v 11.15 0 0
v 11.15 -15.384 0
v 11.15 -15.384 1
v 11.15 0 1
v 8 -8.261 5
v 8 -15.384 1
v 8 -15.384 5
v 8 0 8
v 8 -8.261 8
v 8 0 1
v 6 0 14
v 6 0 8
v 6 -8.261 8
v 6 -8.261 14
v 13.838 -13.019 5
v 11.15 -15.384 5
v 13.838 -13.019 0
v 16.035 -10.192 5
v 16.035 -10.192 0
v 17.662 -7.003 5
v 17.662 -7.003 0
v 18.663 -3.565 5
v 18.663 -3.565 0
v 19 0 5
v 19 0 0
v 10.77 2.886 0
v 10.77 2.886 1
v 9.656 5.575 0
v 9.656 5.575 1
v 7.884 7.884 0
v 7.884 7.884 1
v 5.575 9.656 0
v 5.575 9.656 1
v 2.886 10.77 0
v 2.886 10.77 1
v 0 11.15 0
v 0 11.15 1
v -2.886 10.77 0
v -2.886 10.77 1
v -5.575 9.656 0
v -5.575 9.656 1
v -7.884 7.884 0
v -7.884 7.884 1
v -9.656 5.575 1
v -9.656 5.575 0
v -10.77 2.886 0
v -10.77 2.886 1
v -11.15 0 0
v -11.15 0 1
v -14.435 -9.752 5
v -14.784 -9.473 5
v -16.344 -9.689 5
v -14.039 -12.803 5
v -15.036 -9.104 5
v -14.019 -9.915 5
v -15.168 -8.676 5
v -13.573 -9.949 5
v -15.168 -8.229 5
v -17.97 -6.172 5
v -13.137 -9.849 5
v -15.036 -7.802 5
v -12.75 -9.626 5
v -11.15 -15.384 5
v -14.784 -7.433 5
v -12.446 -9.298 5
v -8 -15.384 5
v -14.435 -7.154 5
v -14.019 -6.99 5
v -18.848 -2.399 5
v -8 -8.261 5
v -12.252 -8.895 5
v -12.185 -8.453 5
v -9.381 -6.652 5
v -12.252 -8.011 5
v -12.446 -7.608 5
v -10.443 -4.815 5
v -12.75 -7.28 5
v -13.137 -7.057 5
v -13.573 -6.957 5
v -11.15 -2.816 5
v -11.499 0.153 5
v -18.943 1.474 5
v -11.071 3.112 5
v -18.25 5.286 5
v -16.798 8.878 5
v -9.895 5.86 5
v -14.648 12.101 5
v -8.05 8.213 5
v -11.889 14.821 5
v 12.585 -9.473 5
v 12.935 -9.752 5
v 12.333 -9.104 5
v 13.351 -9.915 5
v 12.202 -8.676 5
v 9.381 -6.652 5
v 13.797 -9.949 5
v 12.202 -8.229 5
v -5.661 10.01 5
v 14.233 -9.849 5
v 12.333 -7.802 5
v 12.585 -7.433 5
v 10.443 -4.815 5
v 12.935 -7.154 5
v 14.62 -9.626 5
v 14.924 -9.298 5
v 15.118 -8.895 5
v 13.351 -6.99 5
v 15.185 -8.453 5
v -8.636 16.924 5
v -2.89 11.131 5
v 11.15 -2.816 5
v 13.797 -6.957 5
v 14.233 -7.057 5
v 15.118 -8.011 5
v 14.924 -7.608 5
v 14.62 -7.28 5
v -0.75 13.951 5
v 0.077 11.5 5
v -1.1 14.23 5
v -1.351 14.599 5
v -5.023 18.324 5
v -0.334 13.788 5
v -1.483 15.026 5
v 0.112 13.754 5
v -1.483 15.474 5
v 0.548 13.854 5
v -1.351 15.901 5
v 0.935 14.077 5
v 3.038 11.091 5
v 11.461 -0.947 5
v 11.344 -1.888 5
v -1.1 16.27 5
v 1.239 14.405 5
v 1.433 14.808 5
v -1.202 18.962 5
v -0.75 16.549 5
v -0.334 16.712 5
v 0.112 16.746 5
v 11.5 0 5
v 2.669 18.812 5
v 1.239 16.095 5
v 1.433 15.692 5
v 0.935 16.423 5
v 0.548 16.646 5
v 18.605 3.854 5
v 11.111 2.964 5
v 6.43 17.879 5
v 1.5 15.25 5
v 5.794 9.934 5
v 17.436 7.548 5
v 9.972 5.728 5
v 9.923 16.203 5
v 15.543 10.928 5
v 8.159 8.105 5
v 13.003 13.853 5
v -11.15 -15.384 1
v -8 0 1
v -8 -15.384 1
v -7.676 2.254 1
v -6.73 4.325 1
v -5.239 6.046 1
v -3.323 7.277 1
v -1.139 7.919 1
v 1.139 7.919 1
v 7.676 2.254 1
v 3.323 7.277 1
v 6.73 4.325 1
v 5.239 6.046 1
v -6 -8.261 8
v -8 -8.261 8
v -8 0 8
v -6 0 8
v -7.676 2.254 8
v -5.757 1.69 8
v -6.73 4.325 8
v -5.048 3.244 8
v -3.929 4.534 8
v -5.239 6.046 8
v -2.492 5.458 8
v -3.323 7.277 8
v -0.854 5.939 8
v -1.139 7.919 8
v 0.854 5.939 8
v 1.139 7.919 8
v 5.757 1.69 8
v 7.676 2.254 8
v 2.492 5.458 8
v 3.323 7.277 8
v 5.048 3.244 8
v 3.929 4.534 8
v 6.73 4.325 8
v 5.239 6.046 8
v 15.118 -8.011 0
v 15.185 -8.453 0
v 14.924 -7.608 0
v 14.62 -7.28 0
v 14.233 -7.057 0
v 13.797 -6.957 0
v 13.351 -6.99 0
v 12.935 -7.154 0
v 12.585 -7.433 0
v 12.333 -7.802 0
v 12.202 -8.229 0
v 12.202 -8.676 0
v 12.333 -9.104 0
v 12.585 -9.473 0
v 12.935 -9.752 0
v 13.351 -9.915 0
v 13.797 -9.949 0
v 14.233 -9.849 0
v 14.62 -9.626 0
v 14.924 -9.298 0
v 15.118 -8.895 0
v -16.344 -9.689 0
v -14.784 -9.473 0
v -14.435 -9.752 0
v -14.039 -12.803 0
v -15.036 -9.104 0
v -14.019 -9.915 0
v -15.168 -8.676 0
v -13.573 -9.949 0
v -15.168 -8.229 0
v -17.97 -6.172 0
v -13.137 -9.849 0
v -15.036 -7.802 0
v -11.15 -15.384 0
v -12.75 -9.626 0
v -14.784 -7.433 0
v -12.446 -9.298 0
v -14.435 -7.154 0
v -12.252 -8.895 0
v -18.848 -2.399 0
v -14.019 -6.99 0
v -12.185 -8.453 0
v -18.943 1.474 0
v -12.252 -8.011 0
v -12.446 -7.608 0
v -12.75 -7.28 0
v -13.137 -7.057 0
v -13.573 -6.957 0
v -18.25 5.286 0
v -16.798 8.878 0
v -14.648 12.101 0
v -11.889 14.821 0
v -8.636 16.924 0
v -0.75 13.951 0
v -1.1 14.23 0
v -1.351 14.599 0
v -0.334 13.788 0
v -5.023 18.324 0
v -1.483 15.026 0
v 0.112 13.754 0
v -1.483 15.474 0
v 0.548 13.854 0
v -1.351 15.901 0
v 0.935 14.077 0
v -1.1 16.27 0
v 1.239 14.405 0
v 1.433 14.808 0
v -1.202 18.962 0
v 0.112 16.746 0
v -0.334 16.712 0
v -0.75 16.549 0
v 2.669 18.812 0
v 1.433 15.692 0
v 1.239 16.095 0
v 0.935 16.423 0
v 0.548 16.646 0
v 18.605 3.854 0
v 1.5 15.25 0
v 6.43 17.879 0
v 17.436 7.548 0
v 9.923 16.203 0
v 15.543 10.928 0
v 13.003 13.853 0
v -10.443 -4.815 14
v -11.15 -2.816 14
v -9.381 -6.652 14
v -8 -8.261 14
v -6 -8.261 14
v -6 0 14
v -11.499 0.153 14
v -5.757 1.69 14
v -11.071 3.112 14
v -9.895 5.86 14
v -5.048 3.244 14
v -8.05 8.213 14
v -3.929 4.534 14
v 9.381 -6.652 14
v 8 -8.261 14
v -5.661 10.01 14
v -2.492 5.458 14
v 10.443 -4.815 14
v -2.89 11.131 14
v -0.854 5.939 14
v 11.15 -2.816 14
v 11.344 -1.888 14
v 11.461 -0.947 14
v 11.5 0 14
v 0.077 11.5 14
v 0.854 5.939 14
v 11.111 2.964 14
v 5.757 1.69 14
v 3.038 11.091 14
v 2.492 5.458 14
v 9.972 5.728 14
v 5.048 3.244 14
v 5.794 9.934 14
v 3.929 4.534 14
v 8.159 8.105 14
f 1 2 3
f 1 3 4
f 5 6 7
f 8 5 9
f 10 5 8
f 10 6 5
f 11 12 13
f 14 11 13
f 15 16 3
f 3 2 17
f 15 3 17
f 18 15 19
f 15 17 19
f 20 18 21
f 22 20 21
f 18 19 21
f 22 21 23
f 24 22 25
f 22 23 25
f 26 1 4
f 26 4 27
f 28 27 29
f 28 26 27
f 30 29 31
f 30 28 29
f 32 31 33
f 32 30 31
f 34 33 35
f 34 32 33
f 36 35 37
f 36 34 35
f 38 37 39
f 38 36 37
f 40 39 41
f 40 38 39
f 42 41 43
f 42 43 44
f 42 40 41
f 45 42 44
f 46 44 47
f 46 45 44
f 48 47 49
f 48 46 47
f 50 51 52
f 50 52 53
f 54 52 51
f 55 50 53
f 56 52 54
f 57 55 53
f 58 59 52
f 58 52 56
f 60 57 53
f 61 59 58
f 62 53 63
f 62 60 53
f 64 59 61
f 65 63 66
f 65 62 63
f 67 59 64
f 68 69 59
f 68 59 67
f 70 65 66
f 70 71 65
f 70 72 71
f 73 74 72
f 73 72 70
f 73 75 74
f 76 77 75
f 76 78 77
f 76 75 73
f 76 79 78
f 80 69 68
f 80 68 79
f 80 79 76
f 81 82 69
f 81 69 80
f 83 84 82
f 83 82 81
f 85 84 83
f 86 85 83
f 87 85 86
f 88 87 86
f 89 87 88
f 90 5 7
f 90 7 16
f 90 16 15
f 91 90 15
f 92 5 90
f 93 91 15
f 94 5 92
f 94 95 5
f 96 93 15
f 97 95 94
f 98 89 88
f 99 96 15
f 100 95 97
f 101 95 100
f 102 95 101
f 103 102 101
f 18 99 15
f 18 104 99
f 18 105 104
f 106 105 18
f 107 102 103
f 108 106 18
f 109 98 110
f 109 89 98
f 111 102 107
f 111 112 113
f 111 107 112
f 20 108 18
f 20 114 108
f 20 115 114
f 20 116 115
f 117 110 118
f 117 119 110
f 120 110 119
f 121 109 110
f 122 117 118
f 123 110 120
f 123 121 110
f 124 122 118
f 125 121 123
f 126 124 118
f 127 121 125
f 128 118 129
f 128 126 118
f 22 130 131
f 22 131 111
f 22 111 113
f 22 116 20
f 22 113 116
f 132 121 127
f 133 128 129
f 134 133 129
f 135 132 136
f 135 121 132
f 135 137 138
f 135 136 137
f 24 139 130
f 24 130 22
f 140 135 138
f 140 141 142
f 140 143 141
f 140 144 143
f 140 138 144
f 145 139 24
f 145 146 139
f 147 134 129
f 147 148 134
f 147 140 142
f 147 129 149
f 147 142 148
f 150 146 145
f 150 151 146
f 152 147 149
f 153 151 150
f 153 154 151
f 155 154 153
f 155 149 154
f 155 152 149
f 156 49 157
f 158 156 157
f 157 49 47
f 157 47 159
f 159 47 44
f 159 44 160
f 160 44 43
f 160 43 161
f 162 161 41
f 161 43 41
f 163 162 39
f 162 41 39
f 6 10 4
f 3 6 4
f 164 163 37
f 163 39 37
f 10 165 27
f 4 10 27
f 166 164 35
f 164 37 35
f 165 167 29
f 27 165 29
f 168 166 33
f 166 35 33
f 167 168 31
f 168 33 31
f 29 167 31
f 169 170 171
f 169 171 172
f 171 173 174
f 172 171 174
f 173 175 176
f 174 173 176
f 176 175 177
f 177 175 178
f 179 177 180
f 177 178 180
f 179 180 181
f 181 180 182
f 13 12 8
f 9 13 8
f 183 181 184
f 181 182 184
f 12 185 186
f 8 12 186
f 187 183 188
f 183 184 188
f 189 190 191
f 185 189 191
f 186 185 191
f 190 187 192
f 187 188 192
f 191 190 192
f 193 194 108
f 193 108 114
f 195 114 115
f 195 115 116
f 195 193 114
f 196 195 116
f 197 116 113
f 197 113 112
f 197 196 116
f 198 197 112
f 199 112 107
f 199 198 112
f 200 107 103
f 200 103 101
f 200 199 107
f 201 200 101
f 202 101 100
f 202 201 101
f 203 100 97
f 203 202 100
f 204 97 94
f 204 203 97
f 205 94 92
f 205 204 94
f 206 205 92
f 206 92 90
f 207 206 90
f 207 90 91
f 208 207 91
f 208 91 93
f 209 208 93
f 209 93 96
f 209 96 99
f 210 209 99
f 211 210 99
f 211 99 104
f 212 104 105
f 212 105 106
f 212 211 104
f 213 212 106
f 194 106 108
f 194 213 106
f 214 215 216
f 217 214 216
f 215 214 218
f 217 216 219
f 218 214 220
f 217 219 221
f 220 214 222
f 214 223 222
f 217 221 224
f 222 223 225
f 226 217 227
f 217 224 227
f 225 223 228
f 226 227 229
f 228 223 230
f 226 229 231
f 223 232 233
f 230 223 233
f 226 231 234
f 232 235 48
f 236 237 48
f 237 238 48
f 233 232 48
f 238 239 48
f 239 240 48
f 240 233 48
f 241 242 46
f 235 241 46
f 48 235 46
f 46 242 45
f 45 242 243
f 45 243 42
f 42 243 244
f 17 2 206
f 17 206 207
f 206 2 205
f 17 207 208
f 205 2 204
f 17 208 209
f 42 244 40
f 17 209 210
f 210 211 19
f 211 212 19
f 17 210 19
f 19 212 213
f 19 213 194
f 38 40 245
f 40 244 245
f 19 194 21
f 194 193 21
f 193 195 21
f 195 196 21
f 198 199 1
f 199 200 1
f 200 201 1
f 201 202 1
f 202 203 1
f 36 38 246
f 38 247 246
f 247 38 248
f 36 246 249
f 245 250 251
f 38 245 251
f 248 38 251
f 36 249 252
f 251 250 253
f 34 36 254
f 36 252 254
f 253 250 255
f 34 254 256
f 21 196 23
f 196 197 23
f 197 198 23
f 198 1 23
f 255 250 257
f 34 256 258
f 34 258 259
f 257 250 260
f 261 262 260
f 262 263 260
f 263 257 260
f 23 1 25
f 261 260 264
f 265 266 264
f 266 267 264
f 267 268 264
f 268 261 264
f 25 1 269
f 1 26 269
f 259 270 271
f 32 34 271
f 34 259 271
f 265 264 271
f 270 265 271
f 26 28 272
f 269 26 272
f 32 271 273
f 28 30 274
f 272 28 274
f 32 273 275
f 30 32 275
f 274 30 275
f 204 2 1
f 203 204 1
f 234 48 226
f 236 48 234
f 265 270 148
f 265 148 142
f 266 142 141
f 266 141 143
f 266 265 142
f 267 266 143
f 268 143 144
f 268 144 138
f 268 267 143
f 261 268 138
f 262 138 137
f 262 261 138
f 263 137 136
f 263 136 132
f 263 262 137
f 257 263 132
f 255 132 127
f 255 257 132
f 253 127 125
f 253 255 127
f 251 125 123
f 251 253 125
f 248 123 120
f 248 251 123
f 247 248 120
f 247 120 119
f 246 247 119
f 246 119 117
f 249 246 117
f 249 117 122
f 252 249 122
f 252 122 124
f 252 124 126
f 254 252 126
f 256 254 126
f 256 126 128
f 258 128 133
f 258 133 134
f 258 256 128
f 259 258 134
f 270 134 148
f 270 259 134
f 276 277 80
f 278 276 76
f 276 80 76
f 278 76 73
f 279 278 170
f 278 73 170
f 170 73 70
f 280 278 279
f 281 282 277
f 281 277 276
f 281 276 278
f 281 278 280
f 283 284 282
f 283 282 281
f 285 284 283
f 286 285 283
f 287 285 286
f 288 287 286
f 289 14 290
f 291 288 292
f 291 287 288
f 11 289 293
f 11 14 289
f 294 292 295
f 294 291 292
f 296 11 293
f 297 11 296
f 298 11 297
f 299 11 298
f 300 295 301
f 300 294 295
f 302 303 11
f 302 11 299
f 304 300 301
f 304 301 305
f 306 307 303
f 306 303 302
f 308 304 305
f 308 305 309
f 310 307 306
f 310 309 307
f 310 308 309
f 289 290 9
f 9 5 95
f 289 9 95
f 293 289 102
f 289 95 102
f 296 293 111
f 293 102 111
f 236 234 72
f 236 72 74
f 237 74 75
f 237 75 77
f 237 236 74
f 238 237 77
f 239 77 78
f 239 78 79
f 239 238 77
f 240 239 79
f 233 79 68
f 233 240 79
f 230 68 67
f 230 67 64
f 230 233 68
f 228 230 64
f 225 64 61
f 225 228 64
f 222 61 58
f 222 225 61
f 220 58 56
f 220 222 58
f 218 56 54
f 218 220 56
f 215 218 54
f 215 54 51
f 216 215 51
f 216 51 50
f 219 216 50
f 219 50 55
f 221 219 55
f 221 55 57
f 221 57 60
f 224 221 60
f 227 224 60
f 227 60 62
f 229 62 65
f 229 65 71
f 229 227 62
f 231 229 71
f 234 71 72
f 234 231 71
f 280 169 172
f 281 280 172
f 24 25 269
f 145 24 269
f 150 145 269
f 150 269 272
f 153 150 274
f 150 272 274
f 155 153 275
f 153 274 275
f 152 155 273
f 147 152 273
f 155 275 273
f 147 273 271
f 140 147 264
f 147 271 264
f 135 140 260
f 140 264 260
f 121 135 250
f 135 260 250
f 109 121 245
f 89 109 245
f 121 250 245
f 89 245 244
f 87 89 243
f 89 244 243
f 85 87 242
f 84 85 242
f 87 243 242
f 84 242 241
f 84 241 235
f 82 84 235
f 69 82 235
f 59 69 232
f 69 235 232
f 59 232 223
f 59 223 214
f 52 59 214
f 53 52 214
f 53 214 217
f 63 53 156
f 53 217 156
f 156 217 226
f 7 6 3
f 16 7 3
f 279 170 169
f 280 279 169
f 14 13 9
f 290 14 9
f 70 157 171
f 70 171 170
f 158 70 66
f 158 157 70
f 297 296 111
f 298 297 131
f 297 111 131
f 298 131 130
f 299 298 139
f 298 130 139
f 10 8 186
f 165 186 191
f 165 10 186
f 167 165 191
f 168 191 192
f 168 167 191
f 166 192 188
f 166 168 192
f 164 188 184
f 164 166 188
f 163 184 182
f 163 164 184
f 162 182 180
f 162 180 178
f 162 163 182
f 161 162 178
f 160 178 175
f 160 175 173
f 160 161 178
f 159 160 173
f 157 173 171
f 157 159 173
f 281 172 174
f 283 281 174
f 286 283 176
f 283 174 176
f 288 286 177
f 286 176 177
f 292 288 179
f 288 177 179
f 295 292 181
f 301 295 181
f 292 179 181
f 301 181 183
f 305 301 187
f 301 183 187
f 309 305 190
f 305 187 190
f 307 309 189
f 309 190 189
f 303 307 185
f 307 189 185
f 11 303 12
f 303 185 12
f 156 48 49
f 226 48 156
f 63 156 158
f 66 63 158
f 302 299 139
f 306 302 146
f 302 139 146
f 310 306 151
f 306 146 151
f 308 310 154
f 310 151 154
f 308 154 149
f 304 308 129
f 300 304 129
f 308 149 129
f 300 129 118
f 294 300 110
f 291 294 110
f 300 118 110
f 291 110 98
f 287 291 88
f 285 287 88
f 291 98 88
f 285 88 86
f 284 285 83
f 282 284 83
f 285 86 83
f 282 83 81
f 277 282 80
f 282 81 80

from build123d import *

# Parameters (mm, degrees)
F0_R     = 1.5
F1_DEPTH = 5
F2_DEPTH = 14
F3_DEPTH = 8
F4_DEPTH = 1


with BuildPart() as f1:
    # F0 (on Top) → F1 (new body)
    with BuildSketch(Plane.XY):
        with BuildLine():
            ThreePointArc((11.5, 0), (11.4121645624, -1.4186260959), (11.15, -2.8155816451))
            Line((11.15, -2.8155816451), (11.15, -15.3843264396))
            ThreePointArc((11.15, -15.3843264396), (16.9240952491, -8.6356817913), (19, 0))
            ThreePointArc((19, 0), (-8.6356817913, 16.9240952491), (-11.15, -15.3843264396))
            Line((-11.15, -15.3843264396), (-11.15, -2.8155816451))
            ThreePointArc((-11.15, -2.8155816451), (-1.4186260959, 11.4121645624), (11.5, 0))
        make_face()
        with Locations((-13.6848597932, -8.4528724563)):
            Circle(F0_R, mode=Mode.SUBTRACT)
        with Locations((13.6848597932, -8.4528724563)):
            Circle(F0_R, mode=Mode.SUBTRACT)
        with Locations((0, 15.25)):
            Circle(F0_R, mode=Mode.SUBTRACT)
        with BuildLine():
            Line((8, 0), (11.15, 0))
            ThreePointArc((11.15, 0), (0, 11.15), (-11.15, 0))
            Line((-11.15, 0), (-8, 0))
            ThreePointArc((-8, 0), (0, 8), (8, 0))
        make_face()
        with BuildLine():
            ThreePointArc((-11.15, 0), (0, 11.15), (11.15, 0))
            Line((11.15, 0), (11.15, -2.8155816451))
            ThreePointArc((11.15, -2.8155816451), (11.4121645624, -1.4186260959), (11.5, 0))
            ThreePointArc((11.5, 0), (-1.4186260959, 11.4121645624), (-11.15, -2.8155816451))
            Line((-11.15, -2.8155816451), (-11.15, 0))
        make_face()
        with BuildLine():
            Line((6, 0), (8, 0))
            ThreePointArc((8, 0), (0, 8), (-8, 0))
            Line((-8, 0), (-6, 0))
            ThreePointArc((-6, 0), (0, 6), (6, 0))
        make_face()
        with BuildLine():
            Line((-8, 0), (-11.15, 0))
            ThreePointArc((-11.15, 0), (-10.3325335712, -4.1906145134), (-8, -7.7667560796))
            Line((-8, -7.7667560796), (-8, 0))
        make_face()
        with BuildLine():
            ThreePointArc((-8, -8.2613558209), (-9.9546340512, -5.758060516), (-11.15, -2.8155816451))
            Line((-11.15, -2.8155816451), (-11.15, -15.3843264396))
            Line((-11.15, -15.3843264396), (-8, -15.3843264396))
            Line((-8, -15.3843264396), (-8, -8.2613558209))
        make_face()
        with BuildLine():
            ThreePointArc((-8, -7.7667560796), (-10.3325335712, -4.1906145134), (-11.15, 0))
            Line((-11.15, 0), (-11.15, -2.8155816451))
            ThreePointArc((-11.15, -2.8155816451), (-9.9546340512, -5.758060516), (-8, -8.2613558209))
            Line((-8, -8.2613558209), (-8, -7.7667560796))
        make_face()
        with BuildLine():
            ThreePointArc((-6, -9.8107084352), (-7.0427355041, -9.0911977549), (-8, -8.2613558209))
            Line((-8, -8.2613558209), (-8, -15.3843264396))
            Line((-8, -15.3843264396), (-8, -17.2336879396))
            ThreePointArc((-8, -17.2336879396), (-7.0112506852, -17.6590589735), (-6, -18.0277563773))
            Line((-6, -18.0277563773), (-6, -9.8107084352))
        make_face()
        with BuildLine():
            ThreePointArc((-7.4881573167, -8.2613558209), (-7.7480262966, -8.0181412127), (-8, -7.7667560796))
            Line((-8, -7.7667560796), (-8, -8.2613558209))
            Line((-8, -8.2613558209), (-7.4881573167, -8.2613558209))
        make_face()
        with BuildLine():
            Line((-8, 0), (-8, -7.7667560796))
            ThreePointArc((-8, -7.7667560796), (-7.7480262966, -8.0181412127), (-7.4881573167, -8.2613558209))
            Line((-7.4881573167, -8.2613558209), (-6, -8.2613558209))
            Line((-6, -8.2613558209), (-6, -5.2915026221))
            ThreePointArc((-6, -5.2915026221), (-7.4833147735, -2.8284271247), (-8, 0))
        make_face()
        with BuildLine():
            Line((-6, 0), (-8, 0))
            ThreePointArc((-8, 0), (-7.4833147735, -2.8284271247), (-6, -5.2915026221))
            Line((-6, -5.2915026221), (-6, 0))
        make_face()
        with BuildLine():
            ThreePointArc((6, -5.2915026221), (7.4833147735, -2.8284271247), (8, 0))
            Line((8, 0), (6, 0))
            Line((6, 0), (6, -5.2915026221))
        make_face()
        with BuildLine():
            ThreePointArc((6, -9.3980051075), (6.7679827017, -8.8609768169), (7.4881573167, -8.2613558209))
            Line((7.4881573167, -8.2613558209), (6, -8.2613558209))
            Line((6, -8.2613558209), (6, -9.3980051075))
        make_face()
        with BuildLine():
            ThreePointArc((8, -7.7667560796), (10.3325335712, -4.1906145134), (11.15, 0))
            Line((11.15, 0), (8, 0))
            Line((8, 0), (8, -7.7667560796))
        make_face()
        with BuildLine():
            Line((11.15, -15.3843264396), (11.15, -2.8155816451))
            ThreePointArc((11.15, -2.8155816451), (9.9546340512, -5.758060516), (8, -8.2613558209))
            Line((8, -8.2613558209), (8, -15.3843264396))
            Line((8, -15.3843264396), (11.15, -15.3843264396))
        make_face()
        with BuildLine():
            Line((8, -15.3843264396), (8, -8.2613558209))
            ThreePointArc((8, -8.2613558209), (7.0427355041, -9.0911977549), (6, -9.8107084352))
            Line((6, -9.8107084352), (6, -18.0277563773))
            ThreePointArc((6, -18.0277563773), (7.0112506852, -17.6590589735), (8, -17.2336879396))
            Line((8, -17.2336879396), (8, -15.3843264396))
        make_face()
        with BuildLine():
            Line((8, -8.2613558209), (7.4881573167, -8.2613558209))
            ThreePointArc((7.4881573167, -8.2613558209), (6.7679827017, -8.8609768169), (6, -9.3980051075))
            Line((6, -9.3980051075), (6, -9.8107084352))
            ThreePointArc((6, -9.8107084352), (7.0427355041, -9.0911977549), (8, -8.2613558209))
        make_face()
        with BuildLine():
            Line((11.15, -2.8155816451), (11.15, 0))
            ThreePointArc((11.15, 0), (10.3325335712, -4.1906145134), (8, -7.7667560796))
            Line((8, -7.7667560796), (8, -8.2613558209))
            ThreePointArc((8, -8.2613558209), (9.9546340512, -5.758060516), (11.15, -2.8155816451))
        make_face()
    extrude(amount=F1_DEPTH)

    # F0 (on Top) → F2 (join)
    with BuildSketch(Plane.XY):
        with BuildLine():
            ThreePointArc((-11.15, 0), (0, 11.15), (11.15, 0))
            Line((11.15, 0), (11.15, -2.8155816451))
            ThreePointArc((11.15, -2.8155816451), (11.4121645624, -1.4186260959), (11.5, 0))
            ThreePointArc((11.5, 0), (-1.4186260959, 11.4121645624), (-11.15, -2.8155816451))
            Line((-11.15, -2.8155816451), (-11.15, 0))
        make_face()
        with BuildLine():
            Line((8, 0), (11.15, 0))
            ThreePointArc((11.15, 0), (0, 11.15), (-11.15, 0))
            Line((-11.15, 0), (-8, 0))
            ThreePointArc((-8, 0), (0, 8), (8, 0))
        make_face()
        with BuildLine():
            ThreePointArc((8, -7.7667560796), (10.3325335712, -4.1906145134), (11.15, 0))
            Line((11.15, 0), (8, 0))
            Line((8, 0), (8, -7.7667560796))
        make_face()
        with BuildLine():
            Line((11.15, -2.8155816451), (11.15, 0))
            ThreePointArc((11.15, 0), (10.3325335712, -4.1906145134), (8, -7.7667560796))
            Line((8, -7.7667560796), (8, -8.2613558209))
            ThreePointArc((8, -8.2613558209), (9.9546340512, -5.758060516), (11.15, -2.8155816451))
        make_face()
        with BuildLine():
            ThreePointArc((6, -5.2915026221), (7.4833147735, -2.8284271247), (8, 0))
            Line((8, 0), (6, 0))
            Line((6, 0), (6, -5.2915026221))
        make_face()
        with BuildLine():
            Line((6, 0), (8, 0))
            ThreePointArc((8, 0), (0, 8), (-8, 0))
            Line((-8, 0), (-6, 0))
            ThreePointArc((-6, 0), (0, 6), (6, 0))
        make_face()
        with BuildLine():
            Line((-6, 0), (-8, 0))
            ThreePointArc((-8, 0), (-7.4833147735, -2.8284271247), (-6, -5.2915026221))
            Line((-6, -5.2915026221), (-6, 0))
        make_face()
        with BuildLine():
            Line((-8, 0), (-8, -7.7667560796))
            ThreePointArc((-8, -7.7667560796), (-7.7480262966, -8.0181412127), (-7.4881573167, -8.2613558209))
            Line((-7.4881573167, -8.2613558209), (-6, -8.2613558209))
            Line((-6, -8.2613558209), (-6, -5.2915026221))
            ThreePointArc((-6, -5.2915026221), (-7.4833147735, -2.8284271247), (-8, 0))
        make_face()
        with BuildLine():
            Line((-8, 0), (-11.15, 0))
            ThreePointArc((-11.15, 0), (-10.3325335712, -4.1906145134), (-8, -7.7667560796))
            Line((-8, -7.7667560796), (-8, 0))
        make_face()
        with BuildLine():
            ThreePointArc((-8, -7.7667560796), (-10.3325335712, -4.1906145134), (-11.15, 0))
            Line((-11.15, 0), (-11.15, -2.8155816451))
            ThreePointArc((-11.15, -2.8155816451), (-9.9546340512, -5.758060516), (-8, -8.2613558209))
            Line((-8, -8.2613558209), (-8, -7.7667560796))
        make_face()
        with BuildLine():
            ThreePointArc((-7.4881573167, -8.2613558209), (-7.7480262966, -8.0181412127), (-8, -7.7667560796))
            Line((-8, -7.7667560796), (-8, -8.2613558209))
            Line((-8, -8.2613558209), (-7.4881573167, -8.2613558209))
        make_face()
        with BuildLine():
            Line((8, -8.2613558209), (8, -7.7667560796))
            ThreePointArc((8, -7.7667560796), (7.7480262966, -8.0181412127), (7.4881573167, -8.2613558209))
            Line((7.4881573167, -8.2613558209), (8, -8.2613558209))
        make_face()
        with BuildLine():
            ThreePointArc((7.4881573167, -8.2613558209), (7.7480262966, -8.0181412127), (8, -7.7667560796))
            Line((8, -7.7667560796), (8, 0))
            ThreePointArc((8, 0), (7.4833147735, -2.8284271247), (6, -5.2915026221))
            Line((6, -5.2915026221), (6, -8.2613558209))
            Line((6, -8.2613558209), (7.4881573167, -8.2613558209))
        make_face()
    extrude(amount=F2_DEPTH)

    # F0 (on Top) → F3 (cut)
    with BuildSketch(Plane.XY):
        with BuildLine():
            ThreePointArc((6, -5.2915026221), (7.4833147735, -2.8284271247), (8, 0))
            Line((8, 0), (6, 0))
            Line((6, 0), (6, -5.2915026221))
        make_face()
        with BuildLine():
            ThreePointArc((6, -9.3980051075), (6.7679827017, -8.8609768169), (7.4881573167, -8.2613558209))
            Line((7.4881573167, -8.2613558209), (6, -8.2613558209))
            Line((6, -8.2613558209), (6, -9.3980051075))
        make_face()
        with BuildLine():
            Line((8, -15.3843264396), (8, -8.2613558209))
            ThreePointArc((8, -8.2613558209), (7.0427355041, -9.0911977549), (6, -9.8107084352))
            Line((6, -9.8107084352), (6, -18.0277563773))
            ThreePointArc((6, -18.0277563773), (7.0112506852, -17.6590589735), (8, -17.2336879396))
            Line((8, -17.2336879396), (8, -15.3843264396))
        make_face()
        with BuildLine():
            Line((8, -18.7455099076), (8, -17.2336879396))
            ThreePointArc((8, -17.2336879396), (7.0112506852, -17.6590589735), (6, -18.0277563773))
            Line((6, -18.0277563773), (6, -18.7455099076))
            Line((6, -18.7455099076), (8, -18.7455099076))
        make_face()
        with BuildLine():
            Line((8, -8.2613558209), (7.4881573167, -8.2613558209))
            ThreePointArc((7.4881573167, -8.2613558209), (6.7679827017, -8.8609768169), (6, -9.3980051075))
            Line((6, -9.3980051075), (6, -9.8107084352))
            ThreePointArc((6, -9.8107084352), (7.0427355041, -9.0911977549), (8, -8.2613558209))
        make_face()
        with BuildLine():
            ThreePointArc((-6, -18.0277563773), (-7.0112506852, -17.6590589735), (-8, -17.2336879396))
            Line((-8, -17.2336879396), (-8, -18.7455099076))
            Line((-8, -18.7455099076), (-6, -18.7455099076))
            Line((-6, -18.7455099076), (-6, -18.0277563773))
        make_face()
        with BuildLine():
            ThreePointArc((-6, -9.8107084352), (-7.0427355041, -9.0911977549), (-8, -8.2613558209))
            Line((-8, -8.2613558209), (-8, -15.3843264396))
            Line((-8, -15.3843264396), (-8, -17.2336879396))
            ThreePointArc((-8, -17.2336879396), (-7.0112506852, -17.6590589735), (-6, -18.0277563773))
            Line((-6, -18.0277563773), (-6, -9.8107084352))
        make_face()
        with BuildLine():
            Line((-8, 0), (-8, -7.7667560796))
            ThreePointArc((-8, -7.7667560796), (-7.7480262966, -8.0181412127), (-7.4881573167, -8.2613558209))
            Line((-7.4881573167, -8.2613558209), (-6, -8.2613558209))
            Line((-6, -8.2613558209), (-6, -5.2915026221))
            ThreePointArc((-6, -5.2915026221), (-7.4833147735, -2.8284271247), (-8, 0))
        make_face()
        with BuildLine():
            Line((-6, 0), (-8, 0))
            ThreePointArc((-8, 0), (-7.4833147735, -2.8284271247), (-6, -5.2915026221))
            Line((-6, -5.2915026221), (-6, 0))
        make_face()
        with BuildLine():
            ThreePointArc((-7.4881573167, -8.2613558209), (-7.7480262966, -8.0181412127), (-8, -7.7667560796))
            Line((-8, -7.7667560796), (-8, -8.2613558209))
            Line((-8, -8.2613558209), (-7.4881573167, -8.2613558209))
        make_face()
        with BuildLine():
            Line((6, 0), (8, 0))
            ThreePointArc((8, 0), (0, 8), (-8, 0))
            Line((-8, 0), (-6, 0))
            ThreePointArc((-6, 0), (0, 6), (6, 0))
        make_face()
        with BuildLine():
            ThreePointArc((7.4881573167, -8.2613558209), (7.7480262966, -8.0181412127), (8, -7.7667560796))
            Line((8, -7.7667560796), (8, 0))
            ThreePointArc((8, 0), (7.4833147735, -2.8284271247), (6, -5.2915026221))
            Line((6, -5.2915026221), (6, -8.2613558209))
            Line((6, -8.2613558209), (7.4881573167, -8.2613558209))
        make_face()
        with BuildLine():
            Line((8, -8.2613558209), (8, -7.7667560796))
            ThreePointArc((8, -7.7667560796), (7.7480262966, -8.0181412127), (7.4881573167, -8.2613558209))
            Line((7.4881573167, -8.2613558209), (8, -8.2613558209))
        make_face()
    extrude(amount=F3_DEPTH, mode=Mode.SUBTRACT)

    # F0 (on Top) → F4 (cut)
    with BuildSketch(Plane.XY):
        with BuildLine():
            ThreePointArc((8, -7.7667560796), (10.3325335712, -4.1906145134), (11.15, 0))
            Line((11.15, 0), (8, 0))
            Line((8, 0), (8, -7.7667560796))
        make_face()
        with BuildLine():
            Line((11.15, -15.3843264396), (11.15, -2.8155816451))
            ThreePointArc((11.15, -2.8155816451), (9.9546340512, -5.758060516), (8, -8.2613558209))
            Line((8, -8.2613558209), (8, -15.3843264396))
            Line((8, -15.3843264396), (11.15, -15.3843264396))
        make_face()
        with BuildLine():
            Line((11.15, -2.8155816451), (11.15, 0))
            ThreePointArc((11.15, 0), (10.3325335712, -4.1906145134), (8, -7.7667560796))
            Line((8, -7.7667560796), (8, -8.2613558209))
            ThreePointArc((8, -8.2613558209), (9.9546340512, -5.758060516), (11.15, -2.8155816451))
        make_face()
        with BuildLine():
            Line((8, 0), (11.15, 0))
            ThreePointArc((11.15, 0), (0, 11.15), (-11.15, 0))
            Line((-11.15, 0), (-8, 0))
            ThreePointArc((-8, 0), (0, 8), (8, 0))
        make_face()
        with BuildLine():
            Line((-8, 0), (-11.15, 0))
            ThreePointArc((-11.15, 0), (-10.3325335712, -4.1906145134), (-8, -7.7667560796))
            Line((-8, -7.7667560796), (-8, 0))
        make_face()
        with BuildLine():
            ThreePointArc((-8, -7.7667560796), (-10.3325335712, -4.1906145134), (-11.15, 0))
            Line((-11.15, 0), (-11.15, -2.8155816451))
            ThreePointArc((-11.15, -2.8155816451), (-9.9546340512, -5.758060516), (-8, -8.2613558209))
            Line((-8, -8.2613558209), (-8, -7.7667560796))
        make_face()
        with BuildLine():
            ThreePointArc((-8, -8.2613558209), (-9.9546340512, -5.758060516), (-11.15, -2.8155816451))
            Line((-11.15, -2.8155816451), (-11.15, -15.3843264396))
            Line((-11.15, -15.3843264396), (-8, -15.3843264396))
            Line((-8, -15.3843264396), (-8, -8.2613558209))
        make_face()
    extrude(amount=F4_DEPTH, mode=Mode.SUBTRACT)


solid = f1.part
